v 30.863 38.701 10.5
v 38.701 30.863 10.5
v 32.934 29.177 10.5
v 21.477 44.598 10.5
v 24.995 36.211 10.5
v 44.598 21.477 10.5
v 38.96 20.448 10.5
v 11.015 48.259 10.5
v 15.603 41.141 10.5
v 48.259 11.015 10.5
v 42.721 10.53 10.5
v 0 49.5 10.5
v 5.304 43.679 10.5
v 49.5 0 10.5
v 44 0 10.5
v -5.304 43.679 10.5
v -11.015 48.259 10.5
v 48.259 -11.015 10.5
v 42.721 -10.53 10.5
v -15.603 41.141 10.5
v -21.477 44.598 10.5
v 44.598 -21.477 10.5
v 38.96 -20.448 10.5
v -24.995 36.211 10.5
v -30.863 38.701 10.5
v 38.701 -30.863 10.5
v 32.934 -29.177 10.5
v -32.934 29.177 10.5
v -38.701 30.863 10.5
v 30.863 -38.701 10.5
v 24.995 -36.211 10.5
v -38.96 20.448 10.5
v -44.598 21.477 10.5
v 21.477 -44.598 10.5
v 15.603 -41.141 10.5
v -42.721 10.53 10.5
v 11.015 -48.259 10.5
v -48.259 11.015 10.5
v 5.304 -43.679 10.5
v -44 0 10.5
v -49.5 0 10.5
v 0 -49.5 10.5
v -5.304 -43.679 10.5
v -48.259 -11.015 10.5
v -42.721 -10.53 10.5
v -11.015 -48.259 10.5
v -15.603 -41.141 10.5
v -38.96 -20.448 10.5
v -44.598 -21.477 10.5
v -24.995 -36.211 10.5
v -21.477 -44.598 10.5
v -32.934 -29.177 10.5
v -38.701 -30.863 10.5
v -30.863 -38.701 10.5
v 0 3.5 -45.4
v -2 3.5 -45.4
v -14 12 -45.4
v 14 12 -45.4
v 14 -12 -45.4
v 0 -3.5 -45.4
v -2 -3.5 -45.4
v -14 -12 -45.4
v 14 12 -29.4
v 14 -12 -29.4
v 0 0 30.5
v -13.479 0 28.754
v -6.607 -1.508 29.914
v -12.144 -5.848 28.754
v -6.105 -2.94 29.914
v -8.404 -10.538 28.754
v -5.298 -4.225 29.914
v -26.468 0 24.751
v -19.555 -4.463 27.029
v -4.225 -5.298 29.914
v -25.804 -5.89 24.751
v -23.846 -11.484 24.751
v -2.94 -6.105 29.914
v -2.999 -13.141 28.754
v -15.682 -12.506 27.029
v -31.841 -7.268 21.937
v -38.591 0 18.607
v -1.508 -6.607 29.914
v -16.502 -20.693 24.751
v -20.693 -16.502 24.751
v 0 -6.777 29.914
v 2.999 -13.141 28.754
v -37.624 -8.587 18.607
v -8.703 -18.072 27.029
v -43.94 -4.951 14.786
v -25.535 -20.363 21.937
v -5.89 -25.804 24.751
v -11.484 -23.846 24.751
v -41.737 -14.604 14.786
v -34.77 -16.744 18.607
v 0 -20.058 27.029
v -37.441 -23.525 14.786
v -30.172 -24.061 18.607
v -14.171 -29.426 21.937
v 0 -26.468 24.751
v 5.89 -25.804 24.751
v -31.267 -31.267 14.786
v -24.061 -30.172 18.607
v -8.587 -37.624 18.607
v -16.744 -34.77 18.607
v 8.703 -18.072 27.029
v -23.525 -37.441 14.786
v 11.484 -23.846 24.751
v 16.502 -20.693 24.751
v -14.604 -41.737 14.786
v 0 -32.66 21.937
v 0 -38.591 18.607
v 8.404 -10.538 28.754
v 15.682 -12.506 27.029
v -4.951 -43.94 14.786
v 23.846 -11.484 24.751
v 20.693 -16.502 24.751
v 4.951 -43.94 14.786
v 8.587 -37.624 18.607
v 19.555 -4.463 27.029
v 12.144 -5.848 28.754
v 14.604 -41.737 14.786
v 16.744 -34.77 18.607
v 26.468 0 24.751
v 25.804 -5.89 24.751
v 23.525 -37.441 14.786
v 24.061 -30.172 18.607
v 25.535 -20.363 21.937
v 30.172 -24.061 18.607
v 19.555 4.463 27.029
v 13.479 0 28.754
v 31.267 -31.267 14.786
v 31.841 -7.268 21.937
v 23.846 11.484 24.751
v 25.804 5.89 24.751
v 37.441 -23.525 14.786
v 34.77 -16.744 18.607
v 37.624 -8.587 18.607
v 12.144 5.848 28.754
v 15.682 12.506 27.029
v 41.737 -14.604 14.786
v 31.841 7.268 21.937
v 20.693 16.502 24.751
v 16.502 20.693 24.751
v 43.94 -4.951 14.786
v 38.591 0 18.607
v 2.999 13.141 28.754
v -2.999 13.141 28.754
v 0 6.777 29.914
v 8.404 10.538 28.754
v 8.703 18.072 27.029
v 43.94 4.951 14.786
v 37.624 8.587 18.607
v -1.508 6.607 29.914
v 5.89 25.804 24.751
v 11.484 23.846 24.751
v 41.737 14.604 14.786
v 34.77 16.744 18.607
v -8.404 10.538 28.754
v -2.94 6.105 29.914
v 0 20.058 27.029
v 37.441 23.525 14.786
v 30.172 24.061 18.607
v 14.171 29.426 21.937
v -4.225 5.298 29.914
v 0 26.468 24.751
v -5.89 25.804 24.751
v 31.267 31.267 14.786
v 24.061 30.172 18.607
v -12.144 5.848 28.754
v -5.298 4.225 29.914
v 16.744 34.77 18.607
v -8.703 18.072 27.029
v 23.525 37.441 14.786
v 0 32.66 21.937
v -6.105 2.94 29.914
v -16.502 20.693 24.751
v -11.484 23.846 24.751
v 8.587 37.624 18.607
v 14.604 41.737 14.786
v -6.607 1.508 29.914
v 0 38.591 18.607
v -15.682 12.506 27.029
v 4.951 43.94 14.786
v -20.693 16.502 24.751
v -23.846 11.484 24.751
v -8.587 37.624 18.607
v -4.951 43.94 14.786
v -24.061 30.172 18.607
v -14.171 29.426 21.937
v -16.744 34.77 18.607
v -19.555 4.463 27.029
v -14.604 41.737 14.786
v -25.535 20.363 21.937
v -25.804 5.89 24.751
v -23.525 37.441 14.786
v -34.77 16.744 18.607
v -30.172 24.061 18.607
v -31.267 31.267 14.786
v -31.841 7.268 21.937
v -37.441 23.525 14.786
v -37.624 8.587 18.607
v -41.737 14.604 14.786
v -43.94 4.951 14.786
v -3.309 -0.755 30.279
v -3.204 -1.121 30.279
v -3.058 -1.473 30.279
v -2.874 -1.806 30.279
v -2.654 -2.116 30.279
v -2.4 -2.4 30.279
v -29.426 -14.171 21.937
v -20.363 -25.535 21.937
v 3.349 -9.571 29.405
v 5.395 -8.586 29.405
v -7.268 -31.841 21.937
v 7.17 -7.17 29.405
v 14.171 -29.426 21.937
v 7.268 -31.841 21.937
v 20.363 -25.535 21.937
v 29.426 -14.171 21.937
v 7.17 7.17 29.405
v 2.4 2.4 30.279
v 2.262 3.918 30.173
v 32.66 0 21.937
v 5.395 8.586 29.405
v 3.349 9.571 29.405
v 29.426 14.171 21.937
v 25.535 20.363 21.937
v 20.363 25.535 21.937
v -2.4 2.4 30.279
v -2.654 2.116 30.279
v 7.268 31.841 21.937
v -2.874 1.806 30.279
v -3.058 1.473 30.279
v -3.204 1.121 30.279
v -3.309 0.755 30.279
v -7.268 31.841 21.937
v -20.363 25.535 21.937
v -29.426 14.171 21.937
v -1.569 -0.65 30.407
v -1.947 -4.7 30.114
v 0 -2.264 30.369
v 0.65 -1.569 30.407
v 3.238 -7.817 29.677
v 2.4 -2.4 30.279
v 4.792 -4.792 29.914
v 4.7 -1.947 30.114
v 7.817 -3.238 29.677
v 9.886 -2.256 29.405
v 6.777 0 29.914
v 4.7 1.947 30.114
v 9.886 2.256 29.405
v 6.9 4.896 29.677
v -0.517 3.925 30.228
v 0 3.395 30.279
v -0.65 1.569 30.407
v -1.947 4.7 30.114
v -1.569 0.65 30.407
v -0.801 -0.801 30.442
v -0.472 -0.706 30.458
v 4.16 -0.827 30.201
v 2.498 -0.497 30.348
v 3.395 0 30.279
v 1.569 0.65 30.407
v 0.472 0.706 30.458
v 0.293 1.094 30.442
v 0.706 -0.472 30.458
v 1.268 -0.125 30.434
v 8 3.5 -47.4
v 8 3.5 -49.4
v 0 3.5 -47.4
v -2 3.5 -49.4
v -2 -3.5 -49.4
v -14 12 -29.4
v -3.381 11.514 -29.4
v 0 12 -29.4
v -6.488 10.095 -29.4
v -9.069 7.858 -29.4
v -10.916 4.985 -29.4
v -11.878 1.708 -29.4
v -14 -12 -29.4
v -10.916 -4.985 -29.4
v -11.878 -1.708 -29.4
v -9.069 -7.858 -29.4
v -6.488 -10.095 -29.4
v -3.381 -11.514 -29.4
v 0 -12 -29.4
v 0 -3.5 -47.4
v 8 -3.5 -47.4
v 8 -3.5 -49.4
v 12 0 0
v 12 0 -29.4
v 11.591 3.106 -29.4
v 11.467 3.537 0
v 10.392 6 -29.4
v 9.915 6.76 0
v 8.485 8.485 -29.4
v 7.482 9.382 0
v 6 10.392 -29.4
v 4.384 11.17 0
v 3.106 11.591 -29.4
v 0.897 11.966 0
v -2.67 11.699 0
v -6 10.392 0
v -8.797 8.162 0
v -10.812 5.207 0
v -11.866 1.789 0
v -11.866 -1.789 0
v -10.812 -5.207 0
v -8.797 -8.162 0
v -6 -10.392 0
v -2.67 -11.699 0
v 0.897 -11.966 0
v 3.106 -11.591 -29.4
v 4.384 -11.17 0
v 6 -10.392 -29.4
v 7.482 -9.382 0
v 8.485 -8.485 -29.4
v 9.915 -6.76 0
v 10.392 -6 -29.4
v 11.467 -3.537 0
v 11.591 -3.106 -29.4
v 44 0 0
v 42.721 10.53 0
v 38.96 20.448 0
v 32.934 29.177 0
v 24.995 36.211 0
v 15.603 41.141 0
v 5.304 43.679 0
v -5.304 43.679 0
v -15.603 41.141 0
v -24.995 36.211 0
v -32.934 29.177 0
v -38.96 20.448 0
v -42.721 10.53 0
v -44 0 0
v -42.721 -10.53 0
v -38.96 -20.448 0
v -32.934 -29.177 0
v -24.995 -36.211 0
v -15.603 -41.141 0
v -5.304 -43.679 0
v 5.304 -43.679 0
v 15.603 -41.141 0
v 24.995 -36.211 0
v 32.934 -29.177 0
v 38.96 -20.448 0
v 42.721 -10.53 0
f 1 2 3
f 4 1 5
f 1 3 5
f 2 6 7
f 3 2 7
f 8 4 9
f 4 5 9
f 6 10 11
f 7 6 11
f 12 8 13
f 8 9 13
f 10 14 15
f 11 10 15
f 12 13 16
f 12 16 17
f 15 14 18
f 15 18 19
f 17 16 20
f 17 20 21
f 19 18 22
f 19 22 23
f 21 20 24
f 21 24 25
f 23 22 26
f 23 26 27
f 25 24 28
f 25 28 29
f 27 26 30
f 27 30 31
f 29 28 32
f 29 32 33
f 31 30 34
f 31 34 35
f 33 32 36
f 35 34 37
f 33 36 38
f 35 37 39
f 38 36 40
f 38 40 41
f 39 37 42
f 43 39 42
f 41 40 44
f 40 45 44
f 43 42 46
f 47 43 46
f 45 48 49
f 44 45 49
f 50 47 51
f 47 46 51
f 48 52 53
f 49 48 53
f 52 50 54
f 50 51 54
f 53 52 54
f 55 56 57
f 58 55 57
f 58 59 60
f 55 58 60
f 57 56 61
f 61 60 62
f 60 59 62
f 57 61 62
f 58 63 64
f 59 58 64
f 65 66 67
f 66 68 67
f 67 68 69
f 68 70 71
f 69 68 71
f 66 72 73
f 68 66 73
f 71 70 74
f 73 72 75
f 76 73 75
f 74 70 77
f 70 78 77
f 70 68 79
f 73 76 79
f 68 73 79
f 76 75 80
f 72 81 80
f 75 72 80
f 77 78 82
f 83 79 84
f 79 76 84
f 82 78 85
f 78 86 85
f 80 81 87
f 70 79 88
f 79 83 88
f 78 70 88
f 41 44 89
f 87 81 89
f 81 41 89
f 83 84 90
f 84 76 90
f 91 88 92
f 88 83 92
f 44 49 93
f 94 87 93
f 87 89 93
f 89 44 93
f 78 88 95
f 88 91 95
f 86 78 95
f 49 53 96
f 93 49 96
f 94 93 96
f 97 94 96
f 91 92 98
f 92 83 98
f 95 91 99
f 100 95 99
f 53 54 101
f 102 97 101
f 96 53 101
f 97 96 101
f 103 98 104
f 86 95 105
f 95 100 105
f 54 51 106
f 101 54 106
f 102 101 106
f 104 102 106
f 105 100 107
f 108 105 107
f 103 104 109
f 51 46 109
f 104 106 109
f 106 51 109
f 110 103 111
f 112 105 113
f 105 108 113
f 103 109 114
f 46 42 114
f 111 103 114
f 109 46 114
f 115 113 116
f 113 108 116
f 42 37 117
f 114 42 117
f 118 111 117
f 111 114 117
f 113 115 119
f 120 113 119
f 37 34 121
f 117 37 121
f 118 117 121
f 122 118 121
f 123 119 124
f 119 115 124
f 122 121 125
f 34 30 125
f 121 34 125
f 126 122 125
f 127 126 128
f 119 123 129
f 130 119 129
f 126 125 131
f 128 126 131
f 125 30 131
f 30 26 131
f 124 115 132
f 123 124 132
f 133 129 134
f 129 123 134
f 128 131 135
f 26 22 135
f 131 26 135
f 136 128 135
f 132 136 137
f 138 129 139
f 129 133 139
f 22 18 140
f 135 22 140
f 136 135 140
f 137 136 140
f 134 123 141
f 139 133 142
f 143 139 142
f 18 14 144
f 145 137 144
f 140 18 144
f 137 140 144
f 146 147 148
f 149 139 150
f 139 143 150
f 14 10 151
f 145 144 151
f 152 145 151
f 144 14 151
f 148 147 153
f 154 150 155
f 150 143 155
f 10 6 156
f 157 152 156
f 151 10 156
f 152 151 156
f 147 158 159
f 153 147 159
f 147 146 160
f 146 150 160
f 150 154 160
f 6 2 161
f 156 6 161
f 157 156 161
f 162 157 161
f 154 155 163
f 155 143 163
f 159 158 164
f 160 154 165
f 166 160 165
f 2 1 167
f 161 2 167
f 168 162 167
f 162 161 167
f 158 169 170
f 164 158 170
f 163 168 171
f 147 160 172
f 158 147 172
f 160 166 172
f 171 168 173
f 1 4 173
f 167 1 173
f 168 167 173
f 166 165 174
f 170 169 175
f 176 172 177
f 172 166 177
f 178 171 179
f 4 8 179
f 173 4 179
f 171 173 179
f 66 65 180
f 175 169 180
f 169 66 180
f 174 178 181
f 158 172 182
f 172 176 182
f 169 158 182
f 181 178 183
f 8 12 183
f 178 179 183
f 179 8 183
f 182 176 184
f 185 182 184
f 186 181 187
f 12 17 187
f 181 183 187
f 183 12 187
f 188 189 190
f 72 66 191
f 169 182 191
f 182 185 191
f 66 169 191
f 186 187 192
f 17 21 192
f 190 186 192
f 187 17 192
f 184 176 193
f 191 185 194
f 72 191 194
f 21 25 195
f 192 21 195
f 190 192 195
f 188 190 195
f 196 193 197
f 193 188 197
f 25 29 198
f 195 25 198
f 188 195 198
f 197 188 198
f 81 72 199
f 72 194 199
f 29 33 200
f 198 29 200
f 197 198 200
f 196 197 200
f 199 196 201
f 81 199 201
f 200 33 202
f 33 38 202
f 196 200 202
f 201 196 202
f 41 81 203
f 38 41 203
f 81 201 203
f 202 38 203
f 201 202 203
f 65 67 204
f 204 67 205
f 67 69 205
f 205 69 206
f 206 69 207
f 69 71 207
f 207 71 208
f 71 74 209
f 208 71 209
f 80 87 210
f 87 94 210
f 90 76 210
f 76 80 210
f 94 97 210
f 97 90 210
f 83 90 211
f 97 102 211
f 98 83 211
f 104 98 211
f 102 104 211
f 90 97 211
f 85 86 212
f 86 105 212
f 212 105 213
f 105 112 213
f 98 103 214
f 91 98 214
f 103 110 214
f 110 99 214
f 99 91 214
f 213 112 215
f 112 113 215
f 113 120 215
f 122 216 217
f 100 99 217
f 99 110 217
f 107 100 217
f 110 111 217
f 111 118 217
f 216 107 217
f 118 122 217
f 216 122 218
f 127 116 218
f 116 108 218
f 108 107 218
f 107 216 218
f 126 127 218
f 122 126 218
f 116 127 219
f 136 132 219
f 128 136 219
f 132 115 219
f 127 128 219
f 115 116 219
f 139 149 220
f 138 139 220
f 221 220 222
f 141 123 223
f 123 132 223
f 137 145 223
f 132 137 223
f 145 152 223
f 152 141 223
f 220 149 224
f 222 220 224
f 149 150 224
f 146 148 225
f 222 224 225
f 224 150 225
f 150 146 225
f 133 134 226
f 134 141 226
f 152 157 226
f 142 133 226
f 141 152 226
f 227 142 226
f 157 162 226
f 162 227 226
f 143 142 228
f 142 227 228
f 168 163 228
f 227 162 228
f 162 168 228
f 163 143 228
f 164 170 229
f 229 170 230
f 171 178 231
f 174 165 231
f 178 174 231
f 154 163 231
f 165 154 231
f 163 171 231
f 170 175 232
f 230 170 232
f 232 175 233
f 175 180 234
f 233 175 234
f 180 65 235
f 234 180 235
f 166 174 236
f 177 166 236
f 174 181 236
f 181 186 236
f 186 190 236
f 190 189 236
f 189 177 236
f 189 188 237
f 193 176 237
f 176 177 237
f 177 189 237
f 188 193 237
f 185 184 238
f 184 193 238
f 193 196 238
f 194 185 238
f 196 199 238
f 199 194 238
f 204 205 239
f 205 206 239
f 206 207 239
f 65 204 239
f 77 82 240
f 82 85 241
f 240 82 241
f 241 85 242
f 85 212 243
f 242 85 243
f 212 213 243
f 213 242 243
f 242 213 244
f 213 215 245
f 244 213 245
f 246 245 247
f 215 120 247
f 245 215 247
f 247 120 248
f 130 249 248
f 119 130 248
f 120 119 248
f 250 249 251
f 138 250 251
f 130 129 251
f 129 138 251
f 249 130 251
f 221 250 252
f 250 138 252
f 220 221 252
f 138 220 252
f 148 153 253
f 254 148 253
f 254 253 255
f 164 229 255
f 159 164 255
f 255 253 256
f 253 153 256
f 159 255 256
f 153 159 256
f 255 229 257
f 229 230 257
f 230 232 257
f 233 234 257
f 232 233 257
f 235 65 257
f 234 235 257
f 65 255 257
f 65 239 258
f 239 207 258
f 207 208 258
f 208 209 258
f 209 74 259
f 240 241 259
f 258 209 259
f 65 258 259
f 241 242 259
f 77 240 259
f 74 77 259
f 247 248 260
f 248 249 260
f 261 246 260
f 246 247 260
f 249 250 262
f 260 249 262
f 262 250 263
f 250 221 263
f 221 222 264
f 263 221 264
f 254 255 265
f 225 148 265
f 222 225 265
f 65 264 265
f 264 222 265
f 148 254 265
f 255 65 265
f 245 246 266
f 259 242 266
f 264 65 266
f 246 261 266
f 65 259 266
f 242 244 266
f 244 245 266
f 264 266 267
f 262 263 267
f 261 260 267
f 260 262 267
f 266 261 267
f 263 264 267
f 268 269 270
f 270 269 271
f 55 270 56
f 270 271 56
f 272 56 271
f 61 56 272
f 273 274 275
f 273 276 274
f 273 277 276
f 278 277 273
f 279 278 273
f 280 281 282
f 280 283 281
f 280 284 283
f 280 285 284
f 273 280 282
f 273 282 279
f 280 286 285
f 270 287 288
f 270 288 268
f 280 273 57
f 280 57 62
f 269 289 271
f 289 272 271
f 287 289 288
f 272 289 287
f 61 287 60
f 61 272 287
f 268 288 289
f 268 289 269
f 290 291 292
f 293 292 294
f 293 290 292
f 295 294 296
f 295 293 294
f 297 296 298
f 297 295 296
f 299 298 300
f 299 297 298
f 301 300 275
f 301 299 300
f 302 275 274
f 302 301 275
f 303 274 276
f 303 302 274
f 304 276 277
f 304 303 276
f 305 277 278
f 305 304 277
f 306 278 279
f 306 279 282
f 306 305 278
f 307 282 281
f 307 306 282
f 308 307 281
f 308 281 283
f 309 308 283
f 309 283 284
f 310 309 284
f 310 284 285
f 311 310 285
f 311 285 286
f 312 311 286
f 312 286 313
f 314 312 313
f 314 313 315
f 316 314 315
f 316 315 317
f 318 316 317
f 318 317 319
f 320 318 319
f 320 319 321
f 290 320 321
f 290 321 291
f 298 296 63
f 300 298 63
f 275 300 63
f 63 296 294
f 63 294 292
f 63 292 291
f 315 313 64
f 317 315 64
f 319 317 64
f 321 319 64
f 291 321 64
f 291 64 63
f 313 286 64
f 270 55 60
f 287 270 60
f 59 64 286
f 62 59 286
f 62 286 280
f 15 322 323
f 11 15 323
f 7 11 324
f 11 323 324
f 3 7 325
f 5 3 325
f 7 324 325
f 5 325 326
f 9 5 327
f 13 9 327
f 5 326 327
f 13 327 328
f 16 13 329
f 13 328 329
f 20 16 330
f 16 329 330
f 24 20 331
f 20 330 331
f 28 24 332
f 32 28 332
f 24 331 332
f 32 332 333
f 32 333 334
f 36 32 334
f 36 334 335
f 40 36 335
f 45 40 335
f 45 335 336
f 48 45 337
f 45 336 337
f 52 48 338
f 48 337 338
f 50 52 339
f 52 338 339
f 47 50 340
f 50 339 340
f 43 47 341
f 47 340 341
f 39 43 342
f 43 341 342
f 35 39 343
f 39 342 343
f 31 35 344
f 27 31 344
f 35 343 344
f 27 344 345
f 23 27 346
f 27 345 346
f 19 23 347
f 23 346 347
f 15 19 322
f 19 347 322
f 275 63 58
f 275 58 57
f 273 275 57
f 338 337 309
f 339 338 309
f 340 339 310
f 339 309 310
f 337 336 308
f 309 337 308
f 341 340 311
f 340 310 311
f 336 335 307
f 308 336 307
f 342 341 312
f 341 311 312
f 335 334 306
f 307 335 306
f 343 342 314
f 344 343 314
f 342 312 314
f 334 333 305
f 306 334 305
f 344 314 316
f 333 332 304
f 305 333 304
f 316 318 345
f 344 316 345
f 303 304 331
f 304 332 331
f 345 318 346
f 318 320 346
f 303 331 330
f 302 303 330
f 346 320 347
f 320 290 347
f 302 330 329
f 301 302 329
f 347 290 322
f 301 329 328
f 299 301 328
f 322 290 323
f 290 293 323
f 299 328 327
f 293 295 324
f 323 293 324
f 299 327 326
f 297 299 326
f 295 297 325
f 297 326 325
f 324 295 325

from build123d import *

# Parameters (mm, degrees)
F0_R      = 12
F1_DEPTH  = 29.4
F0_R_2    = 44
F2_DEPTH  = 10.5
F5_W      = 14
F5_H      = 24
F6_DEPTH  = 16
F8_W      = 2
F8_H      = 7
F9_DEPTH  = 4
F10_W     = 7
F10_H     = 2
F11_DEPTH = 8


with BuildPart() as f1:
    # F0 (on Top) → F1 (new body)
    with BuildSketch(Plane.XY):
        Circle(F0_R)
    extrude(amount=-F1_DEPTH)

    # F0 (on Top) → F2 (join)
    with BuildSketch(Plane.XY):
        Circle(F0_R_2)
        Circle(F0_R, mode=Mode.SUBTRACT)
        Circle(F0_R)
    extrude(amount=F2_DEPTH)

    # F3 (on Front) → F4 (revolve)
    with BuildSketch(Plane.XZ):
        with BuildLine():
            Line((-49.5, 10.5), (0, 10.5))
            Line((0, 10.5), (0, 30.5))
            ThreePointArc((0, 30.5), (-26.4675851071, 24.7510231401), (-49.5, 10.5))
        make_face()
    revolve(axis=Axis((0, 0, 20.5), (0, 0, 1)))



with BuildPart() as f6:
    # F5 (on face) → F6 (new body)
    with BuildSketch(Plane(origin=(0, 0, -29.4), x_dir=(1, 0, 0), z_dir=(0, 0, -1))):
        with Locations((7, 0)):
            Rectangle(F5_W, F5_H)
    extrude(amount=F6_DEPTH)


with BuildPart() as f1_1:
    add(f1.part)

    add(f6.part)  # F7 merges F6
    # F7: F6 across face
    add(f6.part.mirror(Plane(origin=(0, 0, -37.4), x_dir=(0, -1, 0), z_dir=(-1, 0, 0))))

    # F8 (on face) → F9 (join)
    with BuildSketch(Plane(origin=(0, 0, -45.4), x_dir=(1, 0, 0), z_dir=(0, 0, -1))):
        with Locations((-1, 0)):
            Rectangle(F8_W, F8_H)
    extrude(amount=F9_DEPTH)

    # F10 (on face) → F11 (join)
    with BuildSketch(Plane.YZ):
        with Locations((0, -48.4)):
            Rectangle(F10_W, F10_H)
    extrude(amount=F11_DEPTH)


solid = f1_1.part
